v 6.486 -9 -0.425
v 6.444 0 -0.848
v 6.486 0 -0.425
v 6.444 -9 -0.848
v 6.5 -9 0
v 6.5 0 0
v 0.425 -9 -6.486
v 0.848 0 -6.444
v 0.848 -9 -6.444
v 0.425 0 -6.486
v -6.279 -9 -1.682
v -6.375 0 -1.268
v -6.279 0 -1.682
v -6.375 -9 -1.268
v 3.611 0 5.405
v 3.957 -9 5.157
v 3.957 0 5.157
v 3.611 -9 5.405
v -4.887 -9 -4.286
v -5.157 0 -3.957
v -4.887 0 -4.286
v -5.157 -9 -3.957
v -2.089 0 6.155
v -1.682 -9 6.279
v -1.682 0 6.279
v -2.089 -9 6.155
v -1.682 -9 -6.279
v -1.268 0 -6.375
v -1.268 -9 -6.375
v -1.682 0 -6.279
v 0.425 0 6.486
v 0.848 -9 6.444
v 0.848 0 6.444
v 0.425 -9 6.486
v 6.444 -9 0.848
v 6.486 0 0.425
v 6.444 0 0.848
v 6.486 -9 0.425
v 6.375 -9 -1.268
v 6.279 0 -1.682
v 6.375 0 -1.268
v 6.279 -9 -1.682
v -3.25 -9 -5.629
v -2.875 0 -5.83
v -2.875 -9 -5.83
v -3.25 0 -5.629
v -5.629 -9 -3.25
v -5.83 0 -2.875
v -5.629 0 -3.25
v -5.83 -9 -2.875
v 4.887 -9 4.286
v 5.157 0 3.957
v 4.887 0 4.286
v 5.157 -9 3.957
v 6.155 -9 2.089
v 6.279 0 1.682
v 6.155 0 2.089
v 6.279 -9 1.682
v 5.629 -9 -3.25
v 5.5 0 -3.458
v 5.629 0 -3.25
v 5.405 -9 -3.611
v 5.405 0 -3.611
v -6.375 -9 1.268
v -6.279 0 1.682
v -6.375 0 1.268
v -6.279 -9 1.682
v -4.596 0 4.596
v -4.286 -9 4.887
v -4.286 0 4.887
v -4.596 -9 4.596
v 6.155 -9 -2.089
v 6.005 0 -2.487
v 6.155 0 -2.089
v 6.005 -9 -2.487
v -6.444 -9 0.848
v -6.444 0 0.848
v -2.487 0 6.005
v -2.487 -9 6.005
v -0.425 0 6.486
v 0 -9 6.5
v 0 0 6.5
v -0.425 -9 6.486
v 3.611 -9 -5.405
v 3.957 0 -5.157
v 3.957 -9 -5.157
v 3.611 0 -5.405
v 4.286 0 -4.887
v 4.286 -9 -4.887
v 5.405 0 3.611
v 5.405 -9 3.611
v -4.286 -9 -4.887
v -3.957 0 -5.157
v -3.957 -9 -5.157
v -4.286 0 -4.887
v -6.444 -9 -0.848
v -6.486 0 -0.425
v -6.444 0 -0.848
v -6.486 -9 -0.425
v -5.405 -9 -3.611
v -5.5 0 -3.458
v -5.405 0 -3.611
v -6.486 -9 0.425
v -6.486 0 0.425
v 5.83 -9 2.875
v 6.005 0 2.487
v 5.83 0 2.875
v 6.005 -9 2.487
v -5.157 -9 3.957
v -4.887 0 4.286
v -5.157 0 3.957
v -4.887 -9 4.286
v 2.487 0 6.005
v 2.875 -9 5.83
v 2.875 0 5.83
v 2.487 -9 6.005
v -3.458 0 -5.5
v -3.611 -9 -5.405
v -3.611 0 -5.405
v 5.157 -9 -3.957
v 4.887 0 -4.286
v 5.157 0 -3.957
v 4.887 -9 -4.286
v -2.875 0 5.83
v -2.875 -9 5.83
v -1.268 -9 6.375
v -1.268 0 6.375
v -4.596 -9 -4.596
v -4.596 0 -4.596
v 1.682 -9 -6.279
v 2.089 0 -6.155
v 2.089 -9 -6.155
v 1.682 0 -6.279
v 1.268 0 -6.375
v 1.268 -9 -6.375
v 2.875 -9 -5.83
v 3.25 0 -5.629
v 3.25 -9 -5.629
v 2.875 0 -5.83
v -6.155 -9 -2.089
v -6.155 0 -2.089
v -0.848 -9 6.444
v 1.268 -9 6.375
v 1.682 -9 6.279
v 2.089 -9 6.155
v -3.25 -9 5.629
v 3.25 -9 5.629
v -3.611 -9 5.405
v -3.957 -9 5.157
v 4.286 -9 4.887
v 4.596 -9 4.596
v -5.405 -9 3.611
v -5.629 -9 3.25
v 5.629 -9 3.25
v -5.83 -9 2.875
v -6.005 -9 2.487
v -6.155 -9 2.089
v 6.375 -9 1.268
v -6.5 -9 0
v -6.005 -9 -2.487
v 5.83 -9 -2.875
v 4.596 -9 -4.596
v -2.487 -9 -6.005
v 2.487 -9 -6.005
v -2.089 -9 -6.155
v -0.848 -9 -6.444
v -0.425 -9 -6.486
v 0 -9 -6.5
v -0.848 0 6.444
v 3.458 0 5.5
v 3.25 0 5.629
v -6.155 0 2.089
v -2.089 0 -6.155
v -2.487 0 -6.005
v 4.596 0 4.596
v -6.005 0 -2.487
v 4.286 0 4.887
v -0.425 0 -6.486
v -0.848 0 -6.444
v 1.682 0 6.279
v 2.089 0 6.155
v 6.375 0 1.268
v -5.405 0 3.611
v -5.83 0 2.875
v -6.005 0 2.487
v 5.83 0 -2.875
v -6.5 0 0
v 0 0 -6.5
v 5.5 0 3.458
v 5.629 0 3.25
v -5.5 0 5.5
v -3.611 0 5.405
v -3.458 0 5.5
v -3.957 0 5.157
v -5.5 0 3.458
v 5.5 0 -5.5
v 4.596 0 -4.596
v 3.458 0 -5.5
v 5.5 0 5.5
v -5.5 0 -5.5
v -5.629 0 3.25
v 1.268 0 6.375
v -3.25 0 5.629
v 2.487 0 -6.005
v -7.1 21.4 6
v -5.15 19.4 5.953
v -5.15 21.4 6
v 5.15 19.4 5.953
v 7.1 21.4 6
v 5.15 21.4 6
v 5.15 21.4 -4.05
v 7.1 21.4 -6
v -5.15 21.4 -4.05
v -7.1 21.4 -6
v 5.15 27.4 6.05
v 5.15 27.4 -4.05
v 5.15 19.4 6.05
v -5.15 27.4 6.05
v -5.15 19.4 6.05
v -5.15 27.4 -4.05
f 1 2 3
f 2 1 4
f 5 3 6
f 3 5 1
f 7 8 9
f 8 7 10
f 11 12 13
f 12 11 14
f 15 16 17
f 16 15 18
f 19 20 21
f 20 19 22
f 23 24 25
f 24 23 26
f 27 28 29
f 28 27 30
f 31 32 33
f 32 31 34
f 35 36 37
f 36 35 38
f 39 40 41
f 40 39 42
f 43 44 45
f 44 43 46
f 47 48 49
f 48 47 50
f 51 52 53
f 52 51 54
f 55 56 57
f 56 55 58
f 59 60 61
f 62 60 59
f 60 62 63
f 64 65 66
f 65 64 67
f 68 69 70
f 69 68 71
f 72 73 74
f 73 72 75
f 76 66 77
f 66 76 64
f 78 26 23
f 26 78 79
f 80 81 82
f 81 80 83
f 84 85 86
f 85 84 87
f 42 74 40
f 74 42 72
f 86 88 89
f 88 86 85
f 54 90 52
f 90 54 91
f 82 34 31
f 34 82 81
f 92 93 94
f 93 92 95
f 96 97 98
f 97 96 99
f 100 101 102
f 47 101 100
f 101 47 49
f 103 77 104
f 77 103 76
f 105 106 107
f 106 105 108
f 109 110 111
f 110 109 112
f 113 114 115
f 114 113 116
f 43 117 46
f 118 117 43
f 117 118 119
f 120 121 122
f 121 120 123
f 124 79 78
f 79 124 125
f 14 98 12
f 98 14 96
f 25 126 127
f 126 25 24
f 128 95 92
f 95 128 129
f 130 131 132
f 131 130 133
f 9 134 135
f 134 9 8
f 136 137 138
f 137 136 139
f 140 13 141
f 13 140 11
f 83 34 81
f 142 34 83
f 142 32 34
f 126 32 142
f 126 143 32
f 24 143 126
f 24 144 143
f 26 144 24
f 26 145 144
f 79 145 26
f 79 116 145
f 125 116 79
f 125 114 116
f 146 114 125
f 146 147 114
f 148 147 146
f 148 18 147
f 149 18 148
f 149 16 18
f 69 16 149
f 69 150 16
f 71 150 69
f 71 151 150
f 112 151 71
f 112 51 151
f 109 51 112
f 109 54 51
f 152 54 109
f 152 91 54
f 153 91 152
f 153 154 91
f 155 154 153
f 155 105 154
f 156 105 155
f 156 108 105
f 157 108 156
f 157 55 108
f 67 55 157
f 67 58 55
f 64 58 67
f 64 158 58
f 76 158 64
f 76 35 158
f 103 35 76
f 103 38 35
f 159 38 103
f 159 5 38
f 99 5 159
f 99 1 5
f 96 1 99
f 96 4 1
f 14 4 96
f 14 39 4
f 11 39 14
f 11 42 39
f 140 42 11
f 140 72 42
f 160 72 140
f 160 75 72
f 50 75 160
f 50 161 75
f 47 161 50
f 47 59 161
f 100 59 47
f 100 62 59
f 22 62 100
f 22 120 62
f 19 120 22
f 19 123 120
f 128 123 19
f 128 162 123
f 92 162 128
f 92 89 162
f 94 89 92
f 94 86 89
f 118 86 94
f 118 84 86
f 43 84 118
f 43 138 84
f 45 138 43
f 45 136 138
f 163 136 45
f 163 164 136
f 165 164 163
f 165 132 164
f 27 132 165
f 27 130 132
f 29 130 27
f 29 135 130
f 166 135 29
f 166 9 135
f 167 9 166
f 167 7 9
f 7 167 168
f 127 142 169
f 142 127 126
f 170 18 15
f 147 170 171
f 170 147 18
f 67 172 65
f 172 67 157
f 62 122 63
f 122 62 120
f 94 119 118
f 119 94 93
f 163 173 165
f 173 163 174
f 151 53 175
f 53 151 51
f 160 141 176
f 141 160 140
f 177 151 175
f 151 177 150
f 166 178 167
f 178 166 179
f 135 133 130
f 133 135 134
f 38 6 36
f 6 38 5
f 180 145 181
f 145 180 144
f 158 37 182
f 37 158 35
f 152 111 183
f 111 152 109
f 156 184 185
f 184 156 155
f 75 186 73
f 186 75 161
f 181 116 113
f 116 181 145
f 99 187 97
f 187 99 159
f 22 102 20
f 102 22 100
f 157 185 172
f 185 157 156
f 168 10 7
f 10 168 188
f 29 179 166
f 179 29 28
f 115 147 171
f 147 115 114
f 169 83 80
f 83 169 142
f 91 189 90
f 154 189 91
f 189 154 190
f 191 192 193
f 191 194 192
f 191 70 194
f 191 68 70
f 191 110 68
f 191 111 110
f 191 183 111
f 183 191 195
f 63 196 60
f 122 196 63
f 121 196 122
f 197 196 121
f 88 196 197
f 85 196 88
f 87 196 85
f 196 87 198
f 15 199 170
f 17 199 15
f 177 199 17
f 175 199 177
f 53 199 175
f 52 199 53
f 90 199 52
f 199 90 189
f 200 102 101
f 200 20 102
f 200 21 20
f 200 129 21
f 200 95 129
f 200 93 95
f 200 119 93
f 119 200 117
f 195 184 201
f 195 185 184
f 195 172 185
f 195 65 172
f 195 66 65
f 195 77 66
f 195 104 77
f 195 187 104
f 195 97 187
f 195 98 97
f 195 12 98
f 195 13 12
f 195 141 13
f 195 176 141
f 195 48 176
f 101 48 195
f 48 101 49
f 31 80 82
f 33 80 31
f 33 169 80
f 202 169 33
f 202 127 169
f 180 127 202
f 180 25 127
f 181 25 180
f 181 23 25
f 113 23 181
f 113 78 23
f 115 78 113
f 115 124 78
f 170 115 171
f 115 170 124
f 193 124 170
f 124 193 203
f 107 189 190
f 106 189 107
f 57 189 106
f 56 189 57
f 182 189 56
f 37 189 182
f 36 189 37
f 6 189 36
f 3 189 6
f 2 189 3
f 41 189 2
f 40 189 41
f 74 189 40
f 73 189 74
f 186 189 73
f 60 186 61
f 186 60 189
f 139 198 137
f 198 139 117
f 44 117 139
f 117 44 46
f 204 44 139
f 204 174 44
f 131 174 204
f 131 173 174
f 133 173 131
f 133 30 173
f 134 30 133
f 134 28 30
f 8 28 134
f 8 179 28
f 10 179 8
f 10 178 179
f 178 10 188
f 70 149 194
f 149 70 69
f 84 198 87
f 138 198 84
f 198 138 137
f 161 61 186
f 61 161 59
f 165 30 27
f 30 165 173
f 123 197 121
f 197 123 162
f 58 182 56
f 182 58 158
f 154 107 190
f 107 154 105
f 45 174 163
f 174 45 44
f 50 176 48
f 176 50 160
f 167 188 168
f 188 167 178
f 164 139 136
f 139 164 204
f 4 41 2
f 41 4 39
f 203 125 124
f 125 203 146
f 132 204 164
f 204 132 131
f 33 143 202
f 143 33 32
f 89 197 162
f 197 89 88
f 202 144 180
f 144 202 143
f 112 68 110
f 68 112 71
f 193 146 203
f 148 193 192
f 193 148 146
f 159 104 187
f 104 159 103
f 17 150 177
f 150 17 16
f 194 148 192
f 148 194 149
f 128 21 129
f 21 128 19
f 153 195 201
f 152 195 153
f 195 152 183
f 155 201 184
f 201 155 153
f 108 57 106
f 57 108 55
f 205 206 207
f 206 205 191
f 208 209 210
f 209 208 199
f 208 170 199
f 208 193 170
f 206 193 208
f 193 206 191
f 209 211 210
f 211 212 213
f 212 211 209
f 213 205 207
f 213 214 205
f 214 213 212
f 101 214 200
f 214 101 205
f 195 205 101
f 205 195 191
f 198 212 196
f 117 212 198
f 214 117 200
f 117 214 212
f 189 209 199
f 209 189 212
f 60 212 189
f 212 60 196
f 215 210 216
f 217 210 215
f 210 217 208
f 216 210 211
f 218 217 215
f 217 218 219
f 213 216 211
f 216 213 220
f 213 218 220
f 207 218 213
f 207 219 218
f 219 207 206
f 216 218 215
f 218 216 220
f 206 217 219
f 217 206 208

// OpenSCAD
// Isolated 12V barrel-to-screw-terminal adapter
// Outside -> inside along +Y. The wall interface is the Y=0 plane.
// Negative Y is the barrel (outside the box). Positive Y is inside the box.
// All dimensions are in millimetres and live in this file.

/* [Adapter preview] */
adapter_show_sections = true;

/* [Barrel — outside] */
adapter_barrel_diameter = 13.0;
adapter_barrel_length = 9.0;

/* [Truncated pyramid — body] */
// Face against the barrel / wall (outside)
adapter_pyramid_outer_width = 11.0;
adapter_pyramid_outer_height = 11.0;
// Face toward the screw terminal (inside)
adapter_pyramid_inner_width = 14.2;
adapter_pyramid_inner_height = 12.0;
adapter_pyramid_length = 21.4;

/* [Screw terminal — inside] */
// Longer side is aligned with the pyramid inner-face width.
adapter_terminal_width = 10.3;
adapter_terminal_height = 10.1;
adapter_terminal_length = 8.0;
// How far the terminal sits back into the pyramid inner face.
adapter_terminal_overlap = 2.0;
// Shift the terminal along +Z (up) from the pyramid centreline.
adapter_terminal_z_offset = 1.0;

/* [Quality] */
adapter_fn = $preview ? 32 : 96;

function adapter_pyramid_inner_width() = adapter_pyramid_inner_width;
function adapter_pyramid_inner_height() = adapter_pyramid_inner_height;
function adapter_pyramid_length() = adapter_pyramid_length;
function adapter_terminal_overlap() = adapter_terminal_overlap;
function adapter_terminal_length() = adapter_terminal_length;
function adapter_terminal_z_offset() = adapter_terminal_z_offset;

module rectangular_frustum_y(length, outer_width, outer_height, inner_width, inner_height) {
    polyhedron(
        points = [
            [-outer_width / 2, 0, -outer_height / 2],
            [ outer_width / 2, 0, -outer_height / 2],
            [ outer_width / 2, 0,  outer_height / 2],
            [-outer_width / 2, 0,  outer_height / 2],
            [-inner_width / 2, length, -inner_height / 2],
            [ inner_width / 2, length, -inner_height / 2],
            [ inner_width / 2, length,  inner_height / 2],
            [-inner_width / 2, length,  inner_height / 2]
        ],
        faces = [
            [0, 3, 2, 1],
            [4, 5, 6, 7],
            [0, 1, 5, 4],
            [1, 2, 6, 5],
            [2, 3, 7, 6],
            [3, 0, 4, 7]
        ],
        convexity = 4
    );
}

module adapter_barrel(clearance = 0) {
    translate([0, -adapter_barrel_length - clearance, 0])
        rotate([-90, 0, 0])
            cylinder(
                h = adapter_barrel_length + 2 * clearance,
                d = adapter_barrel_diameter + 2 * clearance,
                $fn = adapter_fn
            );
}

module adapter_pyramid(clearance = 0) {
    translate([0, -clearance, 0])
        rectangular_frustum_y(
            adapter_pyramid_length + 2 * clearance,
            adapter_pyramid_outer_width + 2 * clearance,
            adapter_pyramid_outer_height + 2 * clearance,
            adapter_pyramid_inner_width + 2 * clearance,
            adapter_pyramid_inner_height + 2 * clearance
        );
}

module adapter_terminal(clearance = 0) {
    translate([
        -adapter_terminal_width / 2 - clearance,
        adapter_pyramid_length - adapter_terminal_overlap,
        -adapter_terminal_height / 2 - clearance + adapter_terminal_z_offset
    ])
        cube([
            adapter_terminal_width + 2 * clearance,
            adapter_terminal_length + 2 * clearance,
            adapter_terminal_height + 2 * clearance
        ]);
}

// Full physical adapter. clearance grows every face for use as a box cutter.
module adapter_component(clearance = 0) {
    if (adapter_show_sections && clearance == 0) {
        color("Silver")
            adapter_barrel();
        color("DimGray")
            adapter_pyramid();
        color("ForestGreen")
            adapter_terminal();
    } else {
        union() {
            adapter_barrel(clearance);
            adapter_pyramid(clearance);
            adapter_terminal(clearance);
        }
    }
}

adapter_component();
